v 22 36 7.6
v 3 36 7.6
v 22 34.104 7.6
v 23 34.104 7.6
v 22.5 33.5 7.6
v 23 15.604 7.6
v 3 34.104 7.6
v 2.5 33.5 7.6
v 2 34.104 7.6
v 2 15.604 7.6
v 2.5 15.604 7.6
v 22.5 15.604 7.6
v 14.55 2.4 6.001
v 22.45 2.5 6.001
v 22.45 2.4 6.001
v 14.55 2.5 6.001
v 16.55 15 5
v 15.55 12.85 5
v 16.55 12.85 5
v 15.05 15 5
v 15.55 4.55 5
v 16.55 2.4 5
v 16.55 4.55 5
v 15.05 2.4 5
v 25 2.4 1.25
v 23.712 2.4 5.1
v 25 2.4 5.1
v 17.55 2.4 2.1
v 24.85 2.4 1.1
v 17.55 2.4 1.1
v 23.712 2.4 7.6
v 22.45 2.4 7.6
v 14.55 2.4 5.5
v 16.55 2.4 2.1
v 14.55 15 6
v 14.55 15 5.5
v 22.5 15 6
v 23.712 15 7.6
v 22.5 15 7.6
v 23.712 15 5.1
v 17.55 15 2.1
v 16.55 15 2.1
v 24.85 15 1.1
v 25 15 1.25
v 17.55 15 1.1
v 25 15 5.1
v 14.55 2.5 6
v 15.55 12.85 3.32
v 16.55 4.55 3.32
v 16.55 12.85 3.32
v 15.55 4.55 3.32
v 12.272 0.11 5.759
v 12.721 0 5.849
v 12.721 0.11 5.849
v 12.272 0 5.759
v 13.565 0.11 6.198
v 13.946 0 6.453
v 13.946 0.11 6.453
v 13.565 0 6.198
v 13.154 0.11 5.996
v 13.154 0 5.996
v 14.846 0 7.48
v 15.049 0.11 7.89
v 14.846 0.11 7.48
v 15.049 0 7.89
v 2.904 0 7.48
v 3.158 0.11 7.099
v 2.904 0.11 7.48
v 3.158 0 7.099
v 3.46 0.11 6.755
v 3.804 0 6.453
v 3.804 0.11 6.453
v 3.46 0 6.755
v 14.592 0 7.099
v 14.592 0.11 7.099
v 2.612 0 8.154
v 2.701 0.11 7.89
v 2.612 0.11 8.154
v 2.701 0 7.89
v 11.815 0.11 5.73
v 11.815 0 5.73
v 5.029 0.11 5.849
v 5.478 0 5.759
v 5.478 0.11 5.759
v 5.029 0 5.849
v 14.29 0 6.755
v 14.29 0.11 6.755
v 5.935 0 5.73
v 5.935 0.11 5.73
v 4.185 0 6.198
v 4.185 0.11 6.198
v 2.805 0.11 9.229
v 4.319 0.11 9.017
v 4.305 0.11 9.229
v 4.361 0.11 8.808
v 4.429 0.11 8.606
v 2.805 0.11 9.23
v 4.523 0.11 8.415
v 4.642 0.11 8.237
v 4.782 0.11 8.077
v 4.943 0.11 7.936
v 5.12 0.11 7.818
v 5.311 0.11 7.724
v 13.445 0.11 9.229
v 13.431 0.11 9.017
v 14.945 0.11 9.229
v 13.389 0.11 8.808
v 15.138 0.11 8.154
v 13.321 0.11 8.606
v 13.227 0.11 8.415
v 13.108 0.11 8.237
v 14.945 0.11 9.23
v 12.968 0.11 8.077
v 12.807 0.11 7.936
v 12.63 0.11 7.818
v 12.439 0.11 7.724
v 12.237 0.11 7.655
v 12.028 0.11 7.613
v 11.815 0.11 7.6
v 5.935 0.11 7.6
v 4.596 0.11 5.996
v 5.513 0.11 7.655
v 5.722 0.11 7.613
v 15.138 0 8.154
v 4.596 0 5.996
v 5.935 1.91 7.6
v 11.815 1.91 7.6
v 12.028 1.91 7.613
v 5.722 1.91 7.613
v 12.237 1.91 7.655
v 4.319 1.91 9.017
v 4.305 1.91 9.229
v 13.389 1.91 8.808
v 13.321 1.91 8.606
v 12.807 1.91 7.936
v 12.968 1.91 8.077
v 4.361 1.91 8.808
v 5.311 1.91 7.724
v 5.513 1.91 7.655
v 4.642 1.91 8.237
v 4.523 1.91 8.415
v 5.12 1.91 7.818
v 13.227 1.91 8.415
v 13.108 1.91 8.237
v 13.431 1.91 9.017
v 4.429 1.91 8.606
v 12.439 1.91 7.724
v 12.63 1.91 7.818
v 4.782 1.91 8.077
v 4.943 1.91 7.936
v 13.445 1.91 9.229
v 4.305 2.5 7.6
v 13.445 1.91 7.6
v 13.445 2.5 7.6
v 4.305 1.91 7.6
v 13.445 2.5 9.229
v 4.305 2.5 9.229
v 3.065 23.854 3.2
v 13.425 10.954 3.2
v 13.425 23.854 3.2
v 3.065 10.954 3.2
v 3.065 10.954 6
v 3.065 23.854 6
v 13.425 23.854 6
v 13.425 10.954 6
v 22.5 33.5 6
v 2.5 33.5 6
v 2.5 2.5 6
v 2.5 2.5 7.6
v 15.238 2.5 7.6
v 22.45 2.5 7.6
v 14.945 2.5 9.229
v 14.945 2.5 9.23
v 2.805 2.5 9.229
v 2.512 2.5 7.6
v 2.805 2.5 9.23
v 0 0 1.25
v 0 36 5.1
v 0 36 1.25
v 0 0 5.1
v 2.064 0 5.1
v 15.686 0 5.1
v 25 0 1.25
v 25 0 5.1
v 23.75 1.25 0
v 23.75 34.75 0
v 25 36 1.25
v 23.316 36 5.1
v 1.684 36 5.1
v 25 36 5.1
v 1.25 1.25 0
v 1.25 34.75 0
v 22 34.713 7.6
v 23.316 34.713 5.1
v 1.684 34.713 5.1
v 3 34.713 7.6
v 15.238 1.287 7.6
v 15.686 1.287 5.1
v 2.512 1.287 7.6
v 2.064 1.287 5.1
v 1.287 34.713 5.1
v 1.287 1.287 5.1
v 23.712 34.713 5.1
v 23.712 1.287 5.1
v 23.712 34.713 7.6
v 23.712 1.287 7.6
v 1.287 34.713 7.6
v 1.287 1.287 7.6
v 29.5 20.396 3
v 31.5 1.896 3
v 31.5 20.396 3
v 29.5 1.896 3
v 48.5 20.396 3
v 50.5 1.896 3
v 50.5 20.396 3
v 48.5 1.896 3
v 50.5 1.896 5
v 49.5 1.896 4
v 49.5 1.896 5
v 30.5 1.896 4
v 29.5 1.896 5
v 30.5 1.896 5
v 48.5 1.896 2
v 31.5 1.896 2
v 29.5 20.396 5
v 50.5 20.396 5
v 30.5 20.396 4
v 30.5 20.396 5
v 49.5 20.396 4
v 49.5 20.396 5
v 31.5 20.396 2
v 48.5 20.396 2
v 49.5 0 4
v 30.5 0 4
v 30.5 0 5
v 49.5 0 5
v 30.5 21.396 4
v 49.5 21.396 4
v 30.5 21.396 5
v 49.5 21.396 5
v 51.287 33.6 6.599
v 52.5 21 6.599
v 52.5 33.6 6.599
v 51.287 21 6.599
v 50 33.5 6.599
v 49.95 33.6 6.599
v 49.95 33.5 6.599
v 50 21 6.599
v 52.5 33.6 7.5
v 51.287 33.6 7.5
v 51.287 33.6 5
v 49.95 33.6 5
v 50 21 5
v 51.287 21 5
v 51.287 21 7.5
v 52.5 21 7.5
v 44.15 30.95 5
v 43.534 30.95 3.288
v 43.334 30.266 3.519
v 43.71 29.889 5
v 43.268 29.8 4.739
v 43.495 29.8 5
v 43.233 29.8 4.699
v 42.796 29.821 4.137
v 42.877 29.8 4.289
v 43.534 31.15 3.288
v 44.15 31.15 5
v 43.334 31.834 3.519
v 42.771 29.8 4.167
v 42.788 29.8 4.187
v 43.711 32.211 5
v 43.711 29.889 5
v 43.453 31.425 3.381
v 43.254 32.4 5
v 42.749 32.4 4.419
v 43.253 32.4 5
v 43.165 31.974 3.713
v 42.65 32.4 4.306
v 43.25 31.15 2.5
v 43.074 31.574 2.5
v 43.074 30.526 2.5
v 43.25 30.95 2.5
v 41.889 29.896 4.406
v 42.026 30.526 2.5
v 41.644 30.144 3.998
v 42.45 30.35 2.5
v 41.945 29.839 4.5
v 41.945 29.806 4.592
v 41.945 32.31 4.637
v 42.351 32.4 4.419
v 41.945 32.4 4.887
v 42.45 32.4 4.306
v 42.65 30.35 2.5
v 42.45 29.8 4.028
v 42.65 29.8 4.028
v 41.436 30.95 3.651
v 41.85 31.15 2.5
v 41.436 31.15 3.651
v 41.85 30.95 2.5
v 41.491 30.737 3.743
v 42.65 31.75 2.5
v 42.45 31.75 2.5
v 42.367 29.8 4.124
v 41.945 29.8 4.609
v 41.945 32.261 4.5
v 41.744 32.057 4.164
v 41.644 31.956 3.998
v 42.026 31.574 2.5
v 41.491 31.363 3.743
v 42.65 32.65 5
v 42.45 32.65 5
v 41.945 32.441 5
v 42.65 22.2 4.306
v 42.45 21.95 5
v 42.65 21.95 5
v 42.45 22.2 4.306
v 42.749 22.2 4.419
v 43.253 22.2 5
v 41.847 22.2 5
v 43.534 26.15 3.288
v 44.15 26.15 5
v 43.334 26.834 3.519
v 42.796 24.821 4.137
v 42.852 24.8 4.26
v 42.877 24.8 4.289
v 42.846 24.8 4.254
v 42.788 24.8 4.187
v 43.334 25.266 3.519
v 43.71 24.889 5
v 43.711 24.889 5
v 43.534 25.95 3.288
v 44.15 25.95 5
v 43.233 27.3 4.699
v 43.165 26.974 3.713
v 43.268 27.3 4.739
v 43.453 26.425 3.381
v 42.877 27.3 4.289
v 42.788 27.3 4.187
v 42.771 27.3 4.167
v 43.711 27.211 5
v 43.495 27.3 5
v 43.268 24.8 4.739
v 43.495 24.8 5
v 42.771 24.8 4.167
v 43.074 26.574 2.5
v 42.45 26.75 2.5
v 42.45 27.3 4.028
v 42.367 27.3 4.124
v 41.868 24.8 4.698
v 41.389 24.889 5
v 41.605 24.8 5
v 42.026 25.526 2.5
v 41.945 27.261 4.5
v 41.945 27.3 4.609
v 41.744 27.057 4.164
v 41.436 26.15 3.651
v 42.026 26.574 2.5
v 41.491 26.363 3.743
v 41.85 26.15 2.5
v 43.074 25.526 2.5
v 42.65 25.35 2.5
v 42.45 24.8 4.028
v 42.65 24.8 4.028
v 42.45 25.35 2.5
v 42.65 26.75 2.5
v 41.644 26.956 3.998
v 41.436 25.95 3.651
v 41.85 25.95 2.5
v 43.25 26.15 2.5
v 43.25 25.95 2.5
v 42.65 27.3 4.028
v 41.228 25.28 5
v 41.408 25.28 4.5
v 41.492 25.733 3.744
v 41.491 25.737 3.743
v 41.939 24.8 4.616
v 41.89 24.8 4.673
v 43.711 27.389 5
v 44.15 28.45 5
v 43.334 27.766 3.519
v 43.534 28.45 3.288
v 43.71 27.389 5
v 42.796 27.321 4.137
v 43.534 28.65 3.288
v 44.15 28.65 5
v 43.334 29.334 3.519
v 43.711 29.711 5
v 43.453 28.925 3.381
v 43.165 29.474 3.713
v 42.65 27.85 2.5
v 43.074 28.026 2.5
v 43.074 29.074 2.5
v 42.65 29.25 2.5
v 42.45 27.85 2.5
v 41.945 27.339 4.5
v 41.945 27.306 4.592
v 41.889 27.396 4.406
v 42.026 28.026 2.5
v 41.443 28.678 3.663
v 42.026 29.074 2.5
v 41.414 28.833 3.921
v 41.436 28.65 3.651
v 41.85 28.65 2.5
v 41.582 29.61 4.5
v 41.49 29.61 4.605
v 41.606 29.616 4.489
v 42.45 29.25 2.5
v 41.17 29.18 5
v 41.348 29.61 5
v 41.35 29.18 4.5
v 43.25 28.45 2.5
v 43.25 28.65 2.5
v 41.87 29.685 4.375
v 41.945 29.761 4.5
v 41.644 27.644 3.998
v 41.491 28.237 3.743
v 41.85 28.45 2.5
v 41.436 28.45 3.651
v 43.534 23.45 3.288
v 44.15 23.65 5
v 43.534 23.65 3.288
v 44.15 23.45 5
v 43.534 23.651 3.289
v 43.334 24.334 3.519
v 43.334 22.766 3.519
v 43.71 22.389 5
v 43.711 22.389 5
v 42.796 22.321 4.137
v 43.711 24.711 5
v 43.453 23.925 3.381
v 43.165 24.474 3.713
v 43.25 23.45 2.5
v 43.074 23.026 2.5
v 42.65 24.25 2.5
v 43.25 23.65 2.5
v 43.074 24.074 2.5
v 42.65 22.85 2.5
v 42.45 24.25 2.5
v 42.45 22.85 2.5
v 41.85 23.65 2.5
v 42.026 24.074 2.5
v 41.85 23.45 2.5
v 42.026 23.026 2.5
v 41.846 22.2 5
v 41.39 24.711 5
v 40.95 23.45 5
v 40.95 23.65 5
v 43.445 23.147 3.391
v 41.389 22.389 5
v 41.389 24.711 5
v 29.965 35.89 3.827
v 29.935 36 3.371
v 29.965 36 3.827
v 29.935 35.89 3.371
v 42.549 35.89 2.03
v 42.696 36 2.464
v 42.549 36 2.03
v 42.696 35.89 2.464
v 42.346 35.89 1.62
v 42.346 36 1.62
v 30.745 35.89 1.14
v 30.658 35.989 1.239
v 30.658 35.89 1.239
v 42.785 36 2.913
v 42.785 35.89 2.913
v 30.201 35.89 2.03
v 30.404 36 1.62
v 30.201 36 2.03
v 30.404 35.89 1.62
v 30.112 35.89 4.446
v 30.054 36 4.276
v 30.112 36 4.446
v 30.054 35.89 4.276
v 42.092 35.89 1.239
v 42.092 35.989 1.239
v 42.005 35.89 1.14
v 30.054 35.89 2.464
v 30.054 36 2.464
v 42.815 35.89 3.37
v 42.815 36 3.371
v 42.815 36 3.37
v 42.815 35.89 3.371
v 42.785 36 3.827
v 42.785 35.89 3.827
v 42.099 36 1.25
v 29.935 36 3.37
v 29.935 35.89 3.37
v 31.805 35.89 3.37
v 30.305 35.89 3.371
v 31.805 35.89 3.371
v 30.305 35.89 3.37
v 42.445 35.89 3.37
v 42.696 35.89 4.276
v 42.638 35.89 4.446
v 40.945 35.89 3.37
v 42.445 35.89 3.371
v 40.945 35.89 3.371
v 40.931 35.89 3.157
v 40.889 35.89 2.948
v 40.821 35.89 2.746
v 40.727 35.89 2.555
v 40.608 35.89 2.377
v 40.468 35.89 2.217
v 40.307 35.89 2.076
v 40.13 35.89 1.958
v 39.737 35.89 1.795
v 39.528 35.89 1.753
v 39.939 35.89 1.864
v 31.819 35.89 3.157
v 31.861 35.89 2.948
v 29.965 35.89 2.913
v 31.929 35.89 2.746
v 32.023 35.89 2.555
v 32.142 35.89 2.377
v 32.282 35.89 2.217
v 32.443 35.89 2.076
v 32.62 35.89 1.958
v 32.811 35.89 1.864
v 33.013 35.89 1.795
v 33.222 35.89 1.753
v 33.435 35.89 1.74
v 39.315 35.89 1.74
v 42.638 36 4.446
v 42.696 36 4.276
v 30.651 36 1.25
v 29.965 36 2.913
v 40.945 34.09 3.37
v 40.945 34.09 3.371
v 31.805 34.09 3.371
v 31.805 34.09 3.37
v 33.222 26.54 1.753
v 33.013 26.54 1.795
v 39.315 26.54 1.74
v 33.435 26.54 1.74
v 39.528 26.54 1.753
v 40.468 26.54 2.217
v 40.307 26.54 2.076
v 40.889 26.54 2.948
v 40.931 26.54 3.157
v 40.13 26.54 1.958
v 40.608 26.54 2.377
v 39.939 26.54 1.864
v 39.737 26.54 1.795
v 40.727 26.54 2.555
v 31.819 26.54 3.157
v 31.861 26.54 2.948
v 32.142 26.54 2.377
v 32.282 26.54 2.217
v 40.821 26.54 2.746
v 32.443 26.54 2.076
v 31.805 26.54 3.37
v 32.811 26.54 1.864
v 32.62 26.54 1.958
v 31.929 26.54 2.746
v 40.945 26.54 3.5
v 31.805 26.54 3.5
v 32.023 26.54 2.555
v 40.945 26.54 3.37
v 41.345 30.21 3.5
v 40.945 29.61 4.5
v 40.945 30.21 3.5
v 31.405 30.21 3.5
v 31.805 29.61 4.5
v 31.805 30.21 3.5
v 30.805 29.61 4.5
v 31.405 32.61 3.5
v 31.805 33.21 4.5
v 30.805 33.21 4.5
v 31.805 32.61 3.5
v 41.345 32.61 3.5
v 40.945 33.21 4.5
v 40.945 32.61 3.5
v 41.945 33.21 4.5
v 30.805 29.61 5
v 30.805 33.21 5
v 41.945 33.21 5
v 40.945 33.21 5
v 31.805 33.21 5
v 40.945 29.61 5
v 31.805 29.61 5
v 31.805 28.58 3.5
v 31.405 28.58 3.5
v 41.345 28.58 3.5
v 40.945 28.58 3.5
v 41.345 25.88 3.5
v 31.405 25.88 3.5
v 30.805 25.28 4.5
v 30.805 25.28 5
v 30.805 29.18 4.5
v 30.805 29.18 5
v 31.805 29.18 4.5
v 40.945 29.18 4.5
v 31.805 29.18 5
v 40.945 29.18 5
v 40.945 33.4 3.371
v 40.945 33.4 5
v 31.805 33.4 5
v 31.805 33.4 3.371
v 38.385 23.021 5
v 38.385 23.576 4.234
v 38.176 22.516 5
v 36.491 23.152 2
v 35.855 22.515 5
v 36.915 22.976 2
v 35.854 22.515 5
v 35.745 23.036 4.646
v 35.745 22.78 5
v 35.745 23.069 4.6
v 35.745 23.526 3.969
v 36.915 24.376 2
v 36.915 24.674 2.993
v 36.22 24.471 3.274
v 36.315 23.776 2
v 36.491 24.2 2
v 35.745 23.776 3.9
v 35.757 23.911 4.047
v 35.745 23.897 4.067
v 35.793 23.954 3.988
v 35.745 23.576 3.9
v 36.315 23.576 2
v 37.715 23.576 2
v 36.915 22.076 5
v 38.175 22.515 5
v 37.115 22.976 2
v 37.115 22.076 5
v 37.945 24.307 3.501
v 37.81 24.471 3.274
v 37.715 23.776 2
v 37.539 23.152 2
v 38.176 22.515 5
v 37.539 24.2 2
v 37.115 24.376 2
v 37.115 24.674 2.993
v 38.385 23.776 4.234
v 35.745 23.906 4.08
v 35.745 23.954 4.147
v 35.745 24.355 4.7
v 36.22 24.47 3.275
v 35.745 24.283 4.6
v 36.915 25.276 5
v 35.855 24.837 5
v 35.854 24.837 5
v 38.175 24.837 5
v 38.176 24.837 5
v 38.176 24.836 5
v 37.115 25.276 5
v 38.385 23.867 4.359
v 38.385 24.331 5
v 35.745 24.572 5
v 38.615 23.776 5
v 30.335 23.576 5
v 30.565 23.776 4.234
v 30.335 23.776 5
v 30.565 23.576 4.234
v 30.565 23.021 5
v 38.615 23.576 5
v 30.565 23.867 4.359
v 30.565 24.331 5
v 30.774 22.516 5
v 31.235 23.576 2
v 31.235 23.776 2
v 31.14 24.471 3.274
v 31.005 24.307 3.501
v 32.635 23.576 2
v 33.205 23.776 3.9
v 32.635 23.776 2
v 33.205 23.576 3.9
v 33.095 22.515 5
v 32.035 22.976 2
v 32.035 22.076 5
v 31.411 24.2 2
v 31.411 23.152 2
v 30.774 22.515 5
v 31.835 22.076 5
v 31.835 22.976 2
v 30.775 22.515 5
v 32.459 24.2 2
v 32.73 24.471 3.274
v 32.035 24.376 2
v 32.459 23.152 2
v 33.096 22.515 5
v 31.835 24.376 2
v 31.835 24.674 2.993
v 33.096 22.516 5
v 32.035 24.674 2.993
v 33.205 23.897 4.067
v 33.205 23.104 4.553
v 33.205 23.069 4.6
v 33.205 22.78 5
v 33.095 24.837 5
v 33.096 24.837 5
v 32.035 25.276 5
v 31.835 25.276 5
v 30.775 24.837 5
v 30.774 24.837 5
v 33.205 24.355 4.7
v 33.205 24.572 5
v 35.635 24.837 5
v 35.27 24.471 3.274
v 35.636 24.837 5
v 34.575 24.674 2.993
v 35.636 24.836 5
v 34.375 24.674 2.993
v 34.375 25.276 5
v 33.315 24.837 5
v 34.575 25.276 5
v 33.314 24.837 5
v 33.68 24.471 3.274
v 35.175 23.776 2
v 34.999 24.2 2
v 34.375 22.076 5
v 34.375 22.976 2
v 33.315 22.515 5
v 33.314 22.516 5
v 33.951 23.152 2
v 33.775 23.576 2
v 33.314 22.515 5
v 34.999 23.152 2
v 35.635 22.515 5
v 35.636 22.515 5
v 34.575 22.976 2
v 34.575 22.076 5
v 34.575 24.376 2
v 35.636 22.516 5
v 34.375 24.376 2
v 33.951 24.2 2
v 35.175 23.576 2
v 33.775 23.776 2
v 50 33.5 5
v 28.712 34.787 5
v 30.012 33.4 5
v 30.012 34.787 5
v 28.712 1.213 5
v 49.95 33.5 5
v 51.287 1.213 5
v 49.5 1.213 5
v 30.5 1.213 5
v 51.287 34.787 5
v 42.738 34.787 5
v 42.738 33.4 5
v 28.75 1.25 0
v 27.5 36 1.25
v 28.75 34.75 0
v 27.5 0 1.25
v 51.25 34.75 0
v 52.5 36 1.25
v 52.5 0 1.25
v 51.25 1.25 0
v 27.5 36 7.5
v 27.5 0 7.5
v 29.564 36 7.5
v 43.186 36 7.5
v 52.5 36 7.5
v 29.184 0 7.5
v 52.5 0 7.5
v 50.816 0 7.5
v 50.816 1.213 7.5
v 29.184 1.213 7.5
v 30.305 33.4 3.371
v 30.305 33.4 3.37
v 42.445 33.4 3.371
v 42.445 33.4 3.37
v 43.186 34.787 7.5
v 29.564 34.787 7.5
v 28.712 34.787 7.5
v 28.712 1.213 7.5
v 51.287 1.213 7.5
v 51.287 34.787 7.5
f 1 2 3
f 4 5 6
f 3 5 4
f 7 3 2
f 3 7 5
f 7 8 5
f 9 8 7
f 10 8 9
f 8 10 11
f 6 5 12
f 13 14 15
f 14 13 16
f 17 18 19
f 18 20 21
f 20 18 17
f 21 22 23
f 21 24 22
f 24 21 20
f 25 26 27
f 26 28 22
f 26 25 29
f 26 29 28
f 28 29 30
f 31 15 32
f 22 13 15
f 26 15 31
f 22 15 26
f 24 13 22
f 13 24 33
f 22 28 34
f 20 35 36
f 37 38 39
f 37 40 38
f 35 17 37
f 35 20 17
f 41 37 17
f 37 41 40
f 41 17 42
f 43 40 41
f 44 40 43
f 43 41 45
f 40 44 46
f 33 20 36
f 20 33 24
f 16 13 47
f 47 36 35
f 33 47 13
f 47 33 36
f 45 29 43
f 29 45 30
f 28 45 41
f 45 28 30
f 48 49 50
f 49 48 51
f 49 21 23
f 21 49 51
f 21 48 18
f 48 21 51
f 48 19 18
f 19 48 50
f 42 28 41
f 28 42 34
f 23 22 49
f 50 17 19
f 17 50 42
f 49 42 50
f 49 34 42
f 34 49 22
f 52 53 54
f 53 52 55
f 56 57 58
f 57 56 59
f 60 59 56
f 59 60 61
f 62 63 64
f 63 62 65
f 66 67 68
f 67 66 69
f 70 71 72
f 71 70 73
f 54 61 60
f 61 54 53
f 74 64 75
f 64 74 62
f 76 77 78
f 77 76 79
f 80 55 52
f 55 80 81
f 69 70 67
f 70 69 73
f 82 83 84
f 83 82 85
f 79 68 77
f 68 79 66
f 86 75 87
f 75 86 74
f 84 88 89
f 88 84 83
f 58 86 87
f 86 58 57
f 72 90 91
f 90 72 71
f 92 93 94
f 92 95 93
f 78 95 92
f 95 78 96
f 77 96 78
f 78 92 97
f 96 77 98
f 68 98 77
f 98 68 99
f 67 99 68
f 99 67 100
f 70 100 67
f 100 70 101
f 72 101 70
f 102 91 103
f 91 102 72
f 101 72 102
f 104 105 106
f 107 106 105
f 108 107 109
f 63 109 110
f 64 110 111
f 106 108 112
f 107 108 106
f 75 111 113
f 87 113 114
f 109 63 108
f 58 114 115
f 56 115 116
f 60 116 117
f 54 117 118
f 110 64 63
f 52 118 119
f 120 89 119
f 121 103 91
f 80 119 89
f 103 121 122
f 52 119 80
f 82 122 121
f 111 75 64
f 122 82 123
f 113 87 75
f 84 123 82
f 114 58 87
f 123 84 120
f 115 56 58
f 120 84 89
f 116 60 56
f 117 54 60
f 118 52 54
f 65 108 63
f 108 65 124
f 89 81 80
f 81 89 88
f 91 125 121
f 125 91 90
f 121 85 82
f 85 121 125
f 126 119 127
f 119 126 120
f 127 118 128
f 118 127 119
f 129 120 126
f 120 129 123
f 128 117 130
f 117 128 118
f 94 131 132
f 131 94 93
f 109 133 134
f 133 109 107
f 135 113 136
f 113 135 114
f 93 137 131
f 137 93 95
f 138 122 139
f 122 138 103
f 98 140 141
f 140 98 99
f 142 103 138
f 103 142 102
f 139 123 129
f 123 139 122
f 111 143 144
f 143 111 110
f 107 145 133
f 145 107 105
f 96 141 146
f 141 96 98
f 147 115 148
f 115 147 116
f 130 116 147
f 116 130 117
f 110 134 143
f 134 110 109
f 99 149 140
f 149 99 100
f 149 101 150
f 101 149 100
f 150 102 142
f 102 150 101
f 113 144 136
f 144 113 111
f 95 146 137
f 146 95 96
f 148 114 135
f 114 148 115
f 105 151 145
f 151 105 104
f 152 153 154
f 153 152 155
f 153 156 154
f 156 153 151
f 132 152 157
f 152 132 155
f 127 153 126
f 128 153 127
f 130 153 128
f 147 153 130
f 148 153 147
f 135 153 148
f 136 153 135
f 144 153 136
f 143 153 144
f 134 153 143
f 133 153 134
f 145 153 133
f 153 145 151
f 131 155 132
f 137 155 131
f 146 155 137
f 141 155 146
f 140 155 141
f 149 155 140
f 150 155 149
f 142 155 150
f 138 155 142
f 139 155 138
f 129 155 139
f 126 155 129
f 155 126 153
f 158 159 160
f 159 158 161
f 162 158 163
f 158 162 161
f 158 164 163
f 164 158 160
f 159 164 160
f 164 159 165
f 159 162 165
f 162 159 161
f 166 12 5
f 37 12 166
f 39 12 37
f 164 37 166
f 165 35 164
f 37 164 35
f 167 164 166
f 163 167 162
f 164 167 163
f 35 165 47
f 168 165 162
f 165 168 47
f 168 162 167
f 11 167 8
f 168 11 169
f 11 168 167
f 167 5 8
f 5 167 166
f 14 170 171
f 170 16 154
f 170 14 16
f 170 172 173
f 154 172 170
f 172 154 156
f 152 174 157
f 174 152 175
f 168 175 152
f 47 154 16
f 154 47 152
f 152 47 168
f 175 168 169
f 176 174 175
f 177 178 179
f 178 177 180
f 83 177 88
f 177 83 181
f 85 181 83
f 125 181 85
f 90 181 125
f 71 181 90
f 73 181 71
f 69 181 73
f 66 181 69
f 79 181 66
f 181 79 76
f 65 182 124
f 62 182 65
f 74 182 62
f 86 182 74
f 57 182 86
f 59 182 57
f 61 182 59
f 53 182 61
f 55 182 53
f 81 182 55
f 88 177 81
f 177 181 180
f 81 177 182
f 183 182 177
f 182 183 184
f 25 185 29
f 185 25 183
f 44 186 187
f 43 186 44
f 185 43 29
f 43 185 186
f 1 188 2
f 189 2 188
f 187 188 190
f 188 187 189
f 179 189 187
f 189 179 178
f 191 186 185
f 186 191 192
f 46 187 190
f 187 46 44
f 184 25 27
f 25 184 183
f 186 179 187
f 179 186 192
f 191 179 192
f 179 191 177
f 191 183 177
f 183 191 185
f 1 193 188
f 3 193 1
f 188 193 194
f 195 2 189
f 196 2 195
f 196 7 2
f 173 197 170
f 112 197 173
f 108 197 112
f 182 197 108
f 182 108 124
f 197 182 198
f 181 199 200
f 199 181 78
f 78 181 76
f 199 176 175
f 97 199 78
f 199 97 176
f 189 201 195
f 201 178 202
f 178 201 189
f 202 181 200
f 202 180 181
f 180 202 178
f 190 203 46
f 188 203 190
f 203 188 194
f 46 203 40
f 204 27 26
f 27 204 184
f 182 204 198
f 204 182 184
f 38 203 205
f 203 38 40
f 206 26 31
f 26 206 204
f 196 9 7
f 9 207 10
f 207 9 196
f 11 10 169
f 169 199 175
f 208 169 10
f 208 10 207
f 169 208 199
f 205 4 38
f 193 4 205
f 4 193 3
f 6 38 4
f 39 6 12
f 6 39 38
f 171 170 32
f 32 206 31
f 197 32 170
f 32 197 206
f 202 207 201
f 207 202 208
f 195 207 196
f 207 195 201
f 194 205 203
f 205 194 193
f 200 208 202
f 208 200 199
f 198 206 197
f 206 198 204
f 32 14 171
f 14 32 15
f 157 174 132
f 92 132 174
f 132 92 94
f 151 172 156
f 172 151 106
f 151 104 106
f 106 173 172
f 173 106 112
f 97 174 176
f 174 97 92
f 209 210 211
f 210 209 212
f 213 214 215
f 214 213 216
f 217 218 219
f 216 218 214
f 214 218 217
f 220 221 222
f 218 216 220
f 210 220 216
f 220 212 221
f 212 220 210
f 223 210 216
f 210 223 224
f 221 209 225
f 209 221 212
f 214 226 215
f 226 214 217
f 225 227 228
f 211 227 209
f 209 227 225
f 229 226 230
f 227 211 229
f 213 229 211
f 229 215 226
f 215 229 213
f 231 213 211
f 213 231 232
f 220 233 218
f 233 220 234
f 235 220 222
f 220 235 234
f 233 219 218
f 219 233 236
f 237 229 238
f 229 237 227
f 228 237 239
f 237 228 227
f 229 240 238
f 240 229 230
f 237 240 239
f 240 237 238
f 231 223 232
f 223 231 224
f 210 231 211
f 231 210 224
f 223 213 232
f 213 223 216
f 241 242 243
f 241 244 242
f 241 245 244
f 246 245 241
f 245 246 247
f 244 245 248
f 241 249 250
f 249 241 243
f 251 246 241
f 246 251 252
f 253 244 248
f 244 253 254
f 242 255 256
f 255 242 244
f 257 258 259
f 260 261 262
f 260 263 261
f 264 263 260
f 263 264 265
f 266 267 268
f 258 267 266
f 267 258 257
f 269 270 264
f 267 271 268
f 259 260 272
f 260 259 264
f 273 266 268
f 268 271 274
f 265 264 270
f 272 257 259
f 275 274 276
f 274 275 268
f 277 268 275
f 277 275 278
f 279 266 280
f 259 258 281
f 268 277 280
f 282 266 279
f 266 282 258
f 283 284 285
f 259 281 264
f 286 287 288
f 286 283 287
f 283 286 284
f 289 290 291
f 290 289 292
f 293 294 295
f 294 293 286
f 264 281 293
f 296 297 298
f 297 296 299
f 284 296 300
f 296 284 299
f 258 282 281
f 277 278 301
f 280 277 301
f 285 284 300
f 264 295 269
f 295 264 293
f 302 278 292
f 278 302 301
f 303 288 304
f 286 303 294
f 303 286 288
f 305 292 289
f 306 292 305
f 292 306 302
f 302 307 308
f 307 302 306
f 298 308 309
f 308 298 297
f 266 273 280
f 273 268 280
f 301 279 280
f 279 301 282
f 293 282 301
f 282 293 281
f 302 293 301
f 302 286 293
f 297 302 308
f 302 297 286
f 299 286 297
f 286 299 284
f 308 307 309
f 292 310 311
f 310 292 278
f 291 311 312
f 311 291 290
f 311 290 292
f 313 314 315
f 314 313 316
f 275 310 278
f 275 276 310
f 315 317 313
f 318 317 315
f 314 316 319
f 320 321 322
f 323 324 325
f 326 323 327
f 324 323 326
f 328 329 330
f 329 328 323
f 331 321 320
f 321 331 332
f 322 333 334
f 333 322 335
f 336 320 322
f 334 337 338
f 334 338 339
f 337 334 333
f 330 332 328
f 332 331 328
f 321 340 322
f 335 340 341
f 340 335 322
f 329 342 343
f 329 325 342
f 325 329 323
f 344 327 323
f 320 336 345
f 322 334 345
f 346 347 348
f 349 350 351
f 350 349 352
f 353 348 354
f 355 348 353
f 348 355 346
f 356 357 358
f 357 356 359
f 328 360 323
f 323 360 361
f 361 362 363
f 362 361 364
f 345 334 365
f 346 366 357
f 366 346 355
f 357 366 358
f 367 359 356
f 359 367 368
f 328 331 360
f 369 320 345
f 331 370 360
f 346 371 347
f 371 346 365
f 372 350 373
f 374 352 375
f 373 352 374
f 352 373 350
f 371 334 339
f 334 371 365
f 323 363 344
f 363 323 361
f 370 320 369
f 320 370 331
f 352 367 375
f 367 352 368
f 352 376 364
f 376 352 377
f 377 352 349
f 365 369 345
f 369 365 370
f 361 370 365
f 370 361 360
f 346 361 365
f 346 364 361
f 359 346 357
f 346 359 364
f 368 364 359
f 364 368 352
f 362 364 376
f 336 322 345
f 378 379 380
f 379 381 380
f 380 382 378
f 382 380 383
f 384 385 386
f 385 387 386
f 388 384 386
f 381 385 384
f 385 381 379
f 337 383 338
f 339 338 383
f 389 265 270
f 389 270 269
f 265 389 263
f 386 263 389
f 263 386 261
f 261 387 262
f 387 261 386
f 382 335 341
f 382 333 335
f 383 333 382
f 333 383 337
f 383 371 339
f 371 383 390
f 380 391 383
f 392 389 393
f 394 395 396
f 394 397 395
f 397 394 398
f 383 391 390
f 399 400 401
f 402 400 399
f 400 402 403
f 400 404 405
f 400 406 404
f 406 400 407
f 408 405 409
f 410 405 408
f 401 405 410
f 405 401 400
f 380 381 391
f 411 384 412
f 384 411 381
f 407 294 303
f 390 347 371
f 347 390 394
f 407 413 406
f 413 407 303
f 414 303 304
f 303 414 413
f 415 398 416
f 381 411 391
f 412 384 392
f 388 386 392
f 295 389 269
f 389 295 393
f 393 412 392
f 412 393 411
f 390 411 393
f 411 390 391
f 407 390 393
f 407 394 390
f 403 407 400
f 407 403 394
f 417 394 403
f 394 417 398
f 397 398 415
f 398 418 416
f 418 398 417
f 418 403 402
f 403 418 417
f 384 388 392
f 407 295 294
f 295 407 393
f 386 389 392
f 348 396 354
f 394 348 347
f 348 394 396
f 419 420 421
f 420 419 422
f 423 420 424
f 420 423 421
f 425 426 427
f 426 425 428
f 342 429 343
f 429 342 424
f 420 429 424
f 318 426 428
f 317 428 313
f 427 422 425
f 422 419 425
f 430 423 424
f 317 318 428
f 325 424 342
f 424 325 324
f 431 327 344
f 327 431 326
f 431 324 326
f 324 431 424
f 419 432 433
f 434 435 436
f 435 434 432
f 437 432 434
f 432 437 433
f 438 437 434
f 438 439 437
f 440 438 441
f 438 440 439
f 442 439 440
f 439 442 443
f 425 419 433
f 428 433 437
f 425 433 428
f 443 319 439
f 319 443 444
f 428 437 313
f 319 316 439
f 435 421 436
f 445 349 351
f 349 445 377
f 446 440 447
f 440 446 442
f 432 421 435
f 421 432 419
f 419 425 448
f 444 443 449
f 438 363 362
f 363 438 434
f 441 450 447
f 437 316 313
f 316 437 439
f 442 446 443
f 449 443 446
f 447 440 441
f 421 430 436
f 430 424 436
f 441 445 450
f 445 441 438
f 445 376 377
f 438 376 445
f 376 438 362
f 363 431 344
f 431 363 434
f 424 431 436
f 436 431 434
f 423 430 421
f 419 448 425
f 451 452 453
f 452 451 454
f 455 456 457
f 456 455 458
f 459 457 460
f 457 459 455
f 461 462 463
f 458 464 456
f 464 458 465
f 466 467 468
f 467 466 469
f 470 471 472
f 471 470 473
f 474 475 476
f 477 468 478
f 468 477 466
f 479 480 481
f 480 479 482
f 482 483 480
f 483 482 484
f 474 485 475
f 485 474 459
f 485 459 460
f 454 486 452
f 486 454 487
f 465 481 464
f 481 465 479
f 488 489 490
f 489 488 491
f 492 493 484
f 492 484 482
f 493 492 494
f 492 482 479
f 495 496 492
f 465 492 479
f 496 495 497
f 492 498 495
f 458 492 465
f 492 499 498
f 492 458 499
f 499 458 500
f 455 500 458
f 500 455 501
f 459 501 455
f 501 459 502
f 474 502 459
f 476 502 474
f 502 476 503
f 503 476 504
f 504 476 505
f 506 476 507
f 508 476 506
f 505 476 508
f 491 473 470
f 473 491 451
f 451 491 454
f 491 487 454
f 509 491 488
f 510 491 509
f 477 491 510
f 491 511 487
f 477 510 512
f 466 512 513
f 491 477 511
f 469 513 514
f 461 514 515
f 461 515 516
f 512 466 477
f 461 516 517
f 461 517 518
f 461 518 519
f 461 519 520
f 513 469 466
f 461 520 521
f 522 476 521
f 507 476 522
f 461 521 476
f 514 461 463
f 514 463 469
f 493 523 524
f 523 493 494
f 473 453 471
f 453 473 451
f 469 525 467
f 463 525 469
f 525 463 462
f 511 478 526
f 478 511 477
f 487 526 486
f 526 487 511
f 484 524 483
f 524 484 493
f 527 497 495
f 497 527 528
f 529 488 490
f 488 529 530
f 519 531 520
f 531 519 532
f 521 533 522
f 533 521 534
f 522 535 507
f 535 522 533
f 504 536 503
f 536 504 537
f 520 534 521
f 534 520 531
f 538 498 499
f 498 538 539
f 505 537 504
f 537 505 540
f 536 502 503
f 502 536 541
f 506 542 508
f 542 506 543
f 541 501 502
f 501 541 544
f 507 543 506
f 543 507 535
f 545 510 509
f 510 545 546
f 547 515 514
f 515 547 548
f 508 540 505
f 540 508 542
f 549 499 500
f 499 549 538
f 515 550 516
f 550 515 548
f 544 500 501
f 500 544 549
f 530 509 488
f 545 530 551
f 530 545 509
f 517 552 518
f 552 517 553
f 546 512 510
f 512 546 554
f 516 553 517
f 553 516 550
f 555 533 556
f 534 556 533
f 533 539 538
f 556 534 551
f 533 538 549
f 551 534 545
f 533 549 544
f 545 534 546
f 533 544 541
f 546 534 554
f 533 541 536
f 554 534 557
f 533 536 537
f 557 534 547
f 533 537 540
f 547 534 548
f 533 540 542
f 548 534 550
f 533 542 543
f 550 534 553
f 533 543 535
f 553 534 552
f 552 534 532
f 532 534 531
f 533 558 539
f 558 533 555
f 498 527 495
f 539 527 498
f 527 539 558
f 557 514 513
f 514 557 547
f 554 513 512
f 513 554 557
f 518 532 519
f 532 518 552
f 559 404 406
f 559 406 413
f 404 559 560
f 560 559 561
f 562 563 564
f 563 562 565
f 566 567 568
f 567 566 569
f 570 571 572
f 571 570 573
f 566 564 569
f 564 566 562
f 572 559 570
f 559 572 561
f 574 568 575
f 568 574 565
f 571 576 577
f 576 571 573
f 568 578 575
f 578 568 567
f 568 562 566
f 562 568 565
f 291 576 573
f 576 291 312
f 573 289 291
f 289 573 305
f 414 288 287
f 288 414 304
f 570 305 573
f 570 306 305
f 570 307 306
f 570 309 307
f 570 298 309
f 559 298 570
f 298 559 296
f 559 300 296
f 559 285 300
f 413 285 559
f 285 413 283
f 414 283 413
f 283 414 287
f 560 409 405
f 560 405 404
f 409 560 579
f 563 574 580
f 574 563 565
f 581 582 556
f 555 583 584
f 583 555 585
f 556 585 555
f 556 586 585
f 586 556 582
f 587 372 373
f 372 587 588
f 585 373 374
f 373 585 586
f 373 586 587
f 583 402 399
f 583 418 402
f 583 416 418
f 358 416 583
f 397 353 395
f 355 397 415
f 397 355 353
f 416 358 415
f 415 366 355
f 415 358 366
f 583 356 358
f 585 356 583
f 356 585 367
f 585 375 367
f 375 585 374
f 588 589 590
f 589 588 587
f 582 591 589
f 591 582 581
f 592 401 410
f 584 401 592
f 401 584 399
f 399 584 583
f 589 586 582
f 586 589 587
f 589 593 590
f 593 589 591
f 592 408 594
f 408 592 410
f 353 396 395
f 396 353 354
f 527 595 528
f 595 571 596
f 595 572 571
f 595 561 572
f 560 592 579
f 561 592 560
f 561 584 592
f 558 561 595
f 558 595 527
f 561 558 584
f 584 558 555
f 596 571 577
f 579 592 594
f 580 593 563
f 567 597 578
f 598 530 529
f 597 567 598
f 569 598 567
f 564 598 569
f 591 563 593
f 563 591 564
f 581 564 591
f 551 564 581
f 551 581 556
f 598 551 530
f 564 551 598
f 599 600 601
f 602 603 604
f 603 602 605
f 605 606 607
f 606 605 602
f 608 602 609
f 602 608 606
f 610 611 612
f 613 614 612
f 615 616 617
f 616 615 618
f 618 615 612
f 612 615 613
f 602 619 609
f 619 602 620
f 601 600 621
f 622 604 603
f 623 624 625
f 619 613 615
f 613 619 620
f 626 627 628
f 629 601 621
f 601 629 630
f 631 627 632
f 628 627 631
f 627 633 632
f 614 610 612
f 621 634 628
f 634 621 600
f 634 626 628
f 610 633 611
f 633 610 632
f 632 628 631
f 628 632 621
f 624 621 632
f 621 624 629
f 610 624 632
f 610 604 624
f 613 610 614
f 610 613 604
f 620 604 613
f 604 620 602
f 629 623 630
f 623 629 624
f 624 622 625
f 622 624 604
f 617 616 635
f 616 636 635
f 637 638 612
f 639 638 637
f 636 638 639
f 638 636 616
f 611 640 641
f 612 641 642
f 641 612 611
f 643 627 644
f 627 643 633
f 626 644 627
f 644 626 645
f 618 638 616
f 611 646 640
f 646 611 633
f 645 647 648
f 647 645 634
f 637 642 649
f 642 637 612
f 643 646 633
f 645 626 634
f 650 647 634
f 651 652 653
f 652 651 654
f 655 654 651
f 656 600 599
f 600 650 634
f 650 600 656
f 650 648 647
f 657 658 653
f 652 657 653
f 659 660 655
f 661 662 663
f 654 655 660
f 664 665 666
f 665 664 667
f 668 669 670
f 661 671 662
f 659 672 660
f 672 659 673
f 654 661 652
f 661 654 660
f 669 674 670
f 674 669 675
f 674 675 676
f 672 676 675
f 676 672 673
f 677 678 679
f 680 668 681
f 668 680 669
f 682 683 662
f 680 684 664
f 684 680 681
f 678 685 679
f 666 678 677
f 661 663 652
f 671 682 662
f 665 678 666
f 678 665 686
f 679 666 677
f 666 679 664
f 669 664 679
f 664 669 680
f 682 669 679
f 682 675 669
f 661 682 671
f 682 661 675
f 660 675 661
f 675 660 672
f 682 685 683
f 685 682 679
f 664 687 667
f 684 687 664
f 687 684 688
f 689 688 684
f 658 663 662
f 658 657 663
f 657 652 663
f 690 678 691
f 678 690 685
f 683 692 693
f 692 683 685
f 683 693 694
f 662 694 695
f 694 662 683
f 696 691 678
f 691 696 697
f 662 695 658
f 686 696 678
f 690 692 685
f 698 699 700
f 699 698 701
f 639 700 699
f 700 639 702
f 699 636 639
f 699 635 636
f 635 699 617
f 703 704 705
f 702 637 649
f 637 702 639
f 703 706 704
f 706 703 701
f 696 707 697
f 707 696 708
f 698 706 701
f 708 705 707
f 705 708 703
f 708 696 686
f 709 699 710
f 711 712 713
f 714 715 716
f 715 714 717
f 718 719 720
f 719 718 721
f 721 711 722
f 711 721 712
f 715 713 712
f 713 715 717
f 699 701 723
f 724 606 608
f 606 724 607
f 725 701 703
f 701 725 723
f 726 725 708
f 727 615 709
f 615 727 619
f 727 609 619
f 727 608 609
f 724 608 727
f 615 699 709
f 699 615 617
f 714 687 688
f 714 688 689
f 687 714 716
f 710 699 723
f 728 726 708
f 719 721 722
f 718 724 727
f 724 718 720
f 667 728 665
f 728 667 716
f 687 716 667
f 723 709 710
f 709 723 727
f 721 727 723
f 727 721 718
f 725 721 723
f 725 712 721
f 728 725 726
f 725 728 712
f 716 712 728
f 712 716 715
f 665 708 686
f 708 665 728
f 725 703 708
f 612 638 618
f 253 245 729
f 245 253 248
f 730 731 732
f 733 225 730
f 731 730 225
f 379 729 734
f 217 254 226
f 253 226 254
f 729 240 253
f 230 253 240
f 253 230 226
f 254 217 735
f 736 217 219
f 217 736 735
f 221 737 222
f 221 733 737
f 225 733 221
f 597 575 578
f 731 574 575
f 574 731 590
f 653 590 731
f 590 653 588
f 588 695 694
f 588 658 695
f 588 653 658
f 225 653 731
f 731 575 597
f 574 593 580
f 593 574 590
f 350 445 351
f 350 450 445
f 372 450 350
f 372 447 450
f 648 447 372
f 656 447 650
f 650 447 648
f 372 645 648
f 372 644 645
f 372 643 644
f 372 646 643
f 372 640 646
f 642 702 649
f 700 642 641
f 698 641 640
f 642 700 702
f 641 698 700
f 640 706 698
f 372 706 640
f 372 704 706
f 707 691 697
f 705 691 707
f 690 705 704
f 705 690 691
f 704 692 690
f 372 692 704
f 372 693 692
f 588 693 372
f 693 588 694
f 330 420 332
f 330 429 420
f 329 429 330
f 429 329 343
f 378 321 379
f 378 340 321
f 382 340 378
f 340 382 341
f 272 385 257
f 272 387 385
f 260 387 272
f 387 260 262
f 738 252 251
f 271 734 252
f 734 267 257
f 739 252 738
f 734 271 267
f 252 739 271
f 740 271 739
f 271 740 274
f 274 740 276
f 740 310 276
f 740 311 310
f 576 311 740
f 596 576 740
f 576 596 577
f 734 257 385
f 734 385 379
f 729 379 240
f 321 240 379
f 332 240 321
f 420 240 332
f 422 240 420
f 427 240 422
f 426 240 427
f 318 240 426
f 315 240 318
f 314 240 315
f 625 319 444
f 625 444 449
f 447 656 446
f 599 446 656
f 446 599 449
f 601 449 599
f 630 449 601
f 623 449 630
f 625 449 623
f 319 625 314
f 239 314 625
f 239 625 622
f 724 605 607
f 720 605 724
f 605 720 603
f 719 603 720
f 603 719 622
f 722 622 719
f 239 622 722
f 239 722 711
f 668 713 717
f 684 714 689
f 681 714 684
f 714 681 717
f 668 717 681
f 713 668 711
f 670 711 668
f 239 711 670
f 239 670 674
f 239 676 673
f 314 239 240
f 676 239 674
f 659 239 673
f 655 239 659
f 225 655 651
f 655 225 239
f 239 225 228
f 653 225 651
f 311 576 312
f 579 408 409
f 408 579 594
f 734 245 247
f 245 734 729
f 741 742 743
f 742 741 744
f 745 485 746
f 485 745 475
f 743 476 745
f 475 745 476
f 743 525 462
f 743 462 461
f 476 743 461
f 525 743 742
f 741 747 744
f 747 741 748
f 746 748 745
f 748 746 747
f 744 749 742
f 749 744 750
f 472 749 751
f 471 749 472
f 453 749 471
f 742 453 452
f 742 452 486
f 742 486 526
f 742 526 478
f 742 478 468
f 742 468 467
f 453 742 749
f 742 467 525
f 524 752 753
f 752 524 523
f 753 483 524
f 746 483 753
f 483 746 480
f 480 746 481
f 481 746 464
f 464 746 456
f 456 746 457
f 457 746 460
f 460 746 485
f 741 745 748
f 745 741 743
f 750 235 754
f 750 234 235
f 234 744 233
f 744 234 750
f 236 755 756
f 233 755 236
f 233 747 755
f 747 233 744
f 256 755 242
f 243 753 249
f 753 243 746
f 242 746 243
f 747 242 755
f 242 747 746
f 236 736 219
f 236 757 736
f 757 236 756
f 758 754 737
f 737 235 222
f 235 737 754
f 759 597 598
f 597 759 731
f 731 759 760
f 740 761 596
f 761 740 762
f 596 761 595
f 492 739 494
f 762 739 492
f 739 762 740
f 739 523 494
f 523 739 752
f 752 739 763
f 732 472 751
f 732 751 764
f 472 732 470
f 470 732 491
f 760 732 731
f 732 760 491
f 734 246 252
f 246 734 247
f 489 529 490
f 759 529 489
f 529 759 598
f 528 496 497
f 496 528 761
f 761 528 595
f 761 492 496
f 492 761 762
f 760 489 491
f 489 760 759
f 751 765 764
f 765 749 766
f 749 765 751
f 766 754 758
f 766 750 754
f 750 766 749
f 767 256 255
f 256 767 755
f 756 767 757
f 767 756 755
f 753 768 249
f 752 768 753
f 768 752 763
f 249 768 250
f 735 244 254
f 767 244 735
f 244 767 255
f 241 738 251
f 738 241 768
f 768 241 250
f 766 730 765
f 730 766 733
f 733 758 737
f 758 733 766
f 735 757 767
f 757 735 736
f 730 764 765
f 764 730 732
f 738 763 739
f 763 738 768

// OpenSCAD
// file: parts.scad
// Functions for parts attached to PCB
// Copyright (c) 2019 Adrian Kennard, Andrews & Arnold Limited, see LICENSE file (GPL)

// Origins are top left of PCB, so typically translated -1,-1,1.6 from pcb() to allow for 1 mm margin on SVGs
// The stage parameter is used to allow these functions to be called for pcb(), and cut()
// Stage=0 is the PCB part
// Stage=1 adds to box base
// Stage=-1 cuts in to box base
// Only parts that expect to "stick out" from the case do anything for the cut stages

module posn(x,y,w,h,r,vx=0.2,vy=0.2,vz=0)
{ // Positioning and rotation and growing for placement errors
	s=sin(r);
	c=cos(r);
	translate([x+(s>0?h*s:0)+(c<0?-w*c:0),y+(c<0?-h*c:0)+(s<0?-w*s:0),0])
	rotate([0,0,r])
	{
		if(vx||vy||vz)
		{
			minkowski()
			{
				children();
				cube([vx?vx:0.001,vy?vy:0.001,vz?vz:0.001],center=true);
			}
		}else children();
	}
}

module pads(x,y,d=1.2,h=2.5,nx=1,dx=2.54,ny=1,dy=2.54)
{ // PCB pad, x/y are centre of pin
	for(px=[0:1:nx-1])
	for(py=[0:1:ny-1])
	translate([x+px*dx,y+py*dy,-0.001])
	cylinder(d1=3,d2=d,h=h+0.001,$fn=8);
}

module esp32(stage,x,y,r=0)
{ // Corner of main board of ESP32 18mm by 25.5mm
	posn(x,y,18,25.5,r,1,0.5,0) // Note left/right margin for placement
	{
		if(!stage)
		{
			cube([18,25.5,1]);	// Base PCB
    			translate([1,1,0])
    			cube([16,18,3]);		// Can
    			translate([-1,1,0])
    			cube([20,18,2]); // Solder
		}else{ // Cut
			translate([0,15.5,0])
			hull()
			{
				translate([0,0,stage])
				cube([18,10,1]);	// Base PCB
				translate([-10,0,stage*20])
				cube([18+20,10,1]);
			}
		}
	}
}

module screw(stage,x,y,r,n=2,d,w,h,yp,ys,s=3,pcb=1.6)
{ // Corner of outline
	posn(x,y,d*n,w,r)
	{
		if(!stage)
		{
			pads(d/2,yp?yp:w/2,1.2,3.5-pcb,n,d);
			// Body
			translate([0,0,-pcb-h])
			cube([d*n,w,h+0.001]);
			// Screws
			for(px=[0:1:n-1])
			translate([d/2+d*px,ys?ys:w/2,-pcb-20-h])
			cylinder(d=s,h=20.001);
			// Wires
			for(px=[0:1:n-1])
			translate([d/2+d*px-(d-1)/2,-20,-pcb-1-(d-1)])
			cube([d-1,20.001,d-1]);
		}else{ // Cut
			translate([0,-20,-pcb-1-(d-1)/2-0.5])
			hull()
			{
				translate([0,0,stage/2])
				cube([d*n,20,1]);
				translate([0,0,stage*20])
				cube([d*n,20,1]);
			}
		}
	}
}

module screw5mm(stage,x,y,r,n=2)
{ // 8.1mm wide, 10mm high, 5mm spacing, low profile screw terminals, e.g. RS 897-0843
	screw(stage,x,y,r,n,5,8.1,10);
}

module screw3mm5a(stage,x,y,r,n=2)
{ // 7mm wide, 8.5mm high, 3.5mm spacing, low profile screw terminals, e.g. RS 144-4314
	screw(stage,x,y,r,n,3.5,7,8.5);
}

module screw3mm5(stage,x,y,r,n=2)
{ // 7.2mm wide, 8.75mm high, 3.5mm spacing, low profile screw terminals, e.g. RS 790-1149
	screw(stage,x,y,r,n,3.5,7.2,8.75,3.7,3);
}


module d24v5f3(stage,x,y,r=0,pcb=1.6)
{ // Pololu regulator using only 3 pins
	if(!stage)
	posn(x,y,25.4*0.4,25.4*0.5,r)
	{
		translate([0,0,-pcb-2.8])
		cube([25.4*0.4,25.4*0.5,2.8]);
		pads(25.4*0.05,25.4*0.05,1.2,3,3);

	}
}

module milligrid(stage,x,y,r=0,n=2,pcb=1.6)
{ // eg RS part 6700927
	if(!stage)
	posn(x,y,2.6+n*2,6.4,r)
	{
		translate([0,0,-pcb-6.3])
		cube([2.6+n*2,6.4,6.3001]);
		// Wires
		translate([0.5,0.5,-pcb-6.3-20])
		cube([pcb+n*2,5.4,20.001]);
		// pads
		pads(2.3,2.2,1,1,n,2,2,2);
	}
}


module molex(stage,x,y,r=0,nx=1,ny=1,pcb=1.6)
{ // Simple molex pins
	if(!stage)
	posn(x,y,2.54*nx,2.54*ny,r)
	{
		translate([0,0,-pcb-2.54])
		cube([nx*2.54,ny*2.54,2.5401]);
		for(px=[0:1:nx-1])
		for(py=[0:1:ny-1])
		translate([px*nx+2.54/2-0.5,py*ny+2.54/2-0.5,-9])
		cube([1,1,9.001]);
		pads(2.54/2,2.54/2,1,3.5-1.6,nx,2.54,ny,2.54);
	}
}

module smd1206(stage,x,y,r=0)
{ // Simple 1206
	if(!stage)
	posn(x,y,3.2,1.6,r,0.6,0.6)
	{
		cube([3.2,1.6,1]);
		translate([-0.5,-0.5,0])
		cube([3.2+1,1.6+1,0.5]); // Solder
	}
}

module smdrelay(stage,x,y,r=0)
{ // Solid state relay RS part 6839012
	if(!stage)
	posn(x,y,4.4,3.9,r,0.6,0.6)
	{
		cube([4.4,3.9,3]);
		translate([-1.5,0,0])
		cube([4.4+3,3.9,2]);	// Solder and tags
	}
}

module spox(stage,x,y,r=0,n=2,pcb=1.6,hidden=false)
{
	w=(n-1)*2.5+4.9;
	posn(x,y,w,7.9,r)
	{
		if(!stage)
		{
			pads(2.45,7.5,1.2,2.5,n,2.5);
			translate([0,0,-pcb-4.9])
			cube([w,4.9,4.9]);
			translate([0,0,-pcb-3.9])
    			cube([w,5.9,3.9]);
    			hull()
    			{
				translate([0,0,-pcb-0.5])
        			cube([w,7.9,0.5]);
				translate([0,0,-pcb-1])
        			cube([w,7.4,1]);
    			}
			translate([4.9/2-0.3,0,-pcb-2.38-0.3])
    			cube([w-4.9+0.6,6.6+0.3,2.38+0.3]);
			if(!hidden)
			{
				translate([0,-20,-pcb-4.9])
    				cube([w,20,4.9]);
			}
		}else if(!hidden)
		{ // Cut
			translate([0,-20,-pcb-2])
			hull()
			{
				translate([0,0,stage/2])
				cube([w,20,1]);
				translate([0,0,stage*20])
				cube([w,20,1]);
			}
		}
	}
}

module usbc(stage,x,y,r=0)
{
	posn(x,y,8.94,7.35,r)
	{
		if(!stage)
		{
			cube([8.94,7.35,3.26/2]);
			cube([8.94,8,0.5]);	// Solder
			hull()
			{
				translate([-1,1.88-1,0])
				cube([8.94+2,1.4+2,0.5]); // Solder
				translate([-0.4,1.88-0.4,0])
				cube([8.94+0.8,1.4+0.8,1.5]); // Solder
			}
			hull()
			{
				translate([-1,5.91-1,0])
				cube([8.94+2,1.7+2,0.5]); // Solder
				translate([-0.4,5.91-0.4,0])
				cube([8.94+0.8,1.7+0.8,1.5]); // Solder
			}
			// Posts
			for(px=[-0.155,8.495])
			{
				translate([px,1.88,-1])
				cube([0.9,1.4,1]);
				translate([px,5.91,-1])
				cube([0.9,1.7,1]);
			}
			for(px=[1.28+.3,7.06+0.3])
			translate([px,5.98+.3,-1])
			cylinder(d=0.6,h=1);
			// lead and body
			translate([3.26/2,-2,3.26/2])
			rotate([-90,0,0])
			{
				hull()
				{
					cylinder(d=3.26,h=2+7.35);
					translate([8.94-3.26,0,0])
					cylinder(d=3.26,h=2+7.35);
				}
				// Body of plug
				translate([0,0,-20])
				hull()
				{
					cylinder(d=7,h=20);
					translate([8.94-3.26,0,0])
					cylinder(d=7,h=20);
				}
			}
		}else{ // Cut
			translate([0,-20,3.26/2-0.5])
			hull()
			{
				translate([-1.5,0,stage/2])
				cube([8.94+3,20.49,1]);
				translate([-5,0,stage*20])
				cube([8.94+10,20.49,1]);
			}
		}
	}
}
// file: case.scad
// Functions to make a 3D module case
// Copyright (c) 2019 Adrian Kennard, Andrews & Arnold Limited, see LICENSE file (GPL)

// The concept is that we make a module of the PCB with attached parts, which is then used to cut out the design in a simple cuboid case
// To this end, this file has a set of functions to create the outline for different types of parts

// The case module expects one or two children, and creates the two parts of the case that clip together
// child(0) is the PCB, a cube of width, length, and height with bits attached / sticking out from that
// Typically use parts.scad for various well known parts on a PCV
// If child(1) exists it is the extra parts for cut removed from base (e.g. parts stage -1)
// If child(2) exists it is the extra parts for cut added to base (e.g. parts stage 1)
// Origin for all items is bottom left of PCB, box sticks out around it

module case(width=20,length=20,base=2.5,top=2.5,side=2.5,sidet=0.15,pcb=1.6)
{
	// Base
	intersection()
	{
		casebox(width,length,base,top,side,pcb)children(0);
		casecut(width,length,base,top,side,-sidet/2,pcb)
		{
			if($children>1)children(1);
			if($children>2)children(2);
		}
	}
	// Lid
	translate([width+side*3,length/2+side,(base+pcb+top)/2])
	rotate([180,0,0])
	translate([0,-length/2-side,-(base+pcb+top)/2])
	difference()
	{
		casebox(width,length,base,top,side,pcb)children(0);
		casecut(width,length,base,top,side,sidet/2,pcb)
		{
			if($children>1)children(1);
			if($children>2)children(2);
		}
	}
}

module casebox(width,length,base,top,side,pcb)
{ // The box
	difference()
	{
		hull()
		{
			translate([side/2,side/2,0])
			cube([side+width,side+length,pcb+base+top]); // Case
			translate([0,0,side/2])
			cube([side*2+width,side*2+length,pcb+base+top-side]); // Case
		}
		translate([side,side,base])
		{
			cube([width,length,pcb]); // PCB
			translate([0,0,pcb])
			children();
		}
	}
}

module casecut(width,length,base,top,side,sidet,pcb)
{ // The base cut
	difference()
	{
		offset=pcb/2+0.8;
		union()
		{
			translate([-1,-1,-1])
			cube([side*2+width+2,side*2+length+2,base+1+offset-side]);
			translate([side/2-sidet/2,side/2-sidet/2,base+offset-1.001-side])
			cube([width+side+sidet,length+side+sidet,side+1.001]);
			if($children>0)translate([side,side,base+pcb])children(0);
		}
		if($children>1)translate([side,side,base+pcb])children(1);
		if(sidet<0)translate([side,side,base])cube([width,length,pcb+top+1]);
	}
	if(sidet>0)translate([side,side,-1])cube([width,length,pcb+base+1]);
}
// main file
// 3D case for simple ESP32 device
// Copyright (c) 2019 Adrian Kennard, Andrews & Arnold Limited, see LICENSE file (GPL)

// PCBCase is normally a submodule so needs the directoy
//use <PCBCase/case.scad>
//use <PCBCase/parts.scad>
//For this example the files are in the same directory
use <case.scad>
use <parts.scad>

width=20;
height=31;

// Box thickness reference to component cube
base=6;
top=5;

$fn=48;

module pcb(s=0)
{
    translate([-1,-1,0])
    { // 1mm ref edge of PCB vs SVG design
        esp32(s,2,13.354);
        spox(s,13.150,1,90,4);
        usbc(s,2.905,0.51);
        d24v5f3(s,1.665,9.554);
    }
}

case(width,height,base,top){pcb(0);pcb(-1);pcb(1);};
